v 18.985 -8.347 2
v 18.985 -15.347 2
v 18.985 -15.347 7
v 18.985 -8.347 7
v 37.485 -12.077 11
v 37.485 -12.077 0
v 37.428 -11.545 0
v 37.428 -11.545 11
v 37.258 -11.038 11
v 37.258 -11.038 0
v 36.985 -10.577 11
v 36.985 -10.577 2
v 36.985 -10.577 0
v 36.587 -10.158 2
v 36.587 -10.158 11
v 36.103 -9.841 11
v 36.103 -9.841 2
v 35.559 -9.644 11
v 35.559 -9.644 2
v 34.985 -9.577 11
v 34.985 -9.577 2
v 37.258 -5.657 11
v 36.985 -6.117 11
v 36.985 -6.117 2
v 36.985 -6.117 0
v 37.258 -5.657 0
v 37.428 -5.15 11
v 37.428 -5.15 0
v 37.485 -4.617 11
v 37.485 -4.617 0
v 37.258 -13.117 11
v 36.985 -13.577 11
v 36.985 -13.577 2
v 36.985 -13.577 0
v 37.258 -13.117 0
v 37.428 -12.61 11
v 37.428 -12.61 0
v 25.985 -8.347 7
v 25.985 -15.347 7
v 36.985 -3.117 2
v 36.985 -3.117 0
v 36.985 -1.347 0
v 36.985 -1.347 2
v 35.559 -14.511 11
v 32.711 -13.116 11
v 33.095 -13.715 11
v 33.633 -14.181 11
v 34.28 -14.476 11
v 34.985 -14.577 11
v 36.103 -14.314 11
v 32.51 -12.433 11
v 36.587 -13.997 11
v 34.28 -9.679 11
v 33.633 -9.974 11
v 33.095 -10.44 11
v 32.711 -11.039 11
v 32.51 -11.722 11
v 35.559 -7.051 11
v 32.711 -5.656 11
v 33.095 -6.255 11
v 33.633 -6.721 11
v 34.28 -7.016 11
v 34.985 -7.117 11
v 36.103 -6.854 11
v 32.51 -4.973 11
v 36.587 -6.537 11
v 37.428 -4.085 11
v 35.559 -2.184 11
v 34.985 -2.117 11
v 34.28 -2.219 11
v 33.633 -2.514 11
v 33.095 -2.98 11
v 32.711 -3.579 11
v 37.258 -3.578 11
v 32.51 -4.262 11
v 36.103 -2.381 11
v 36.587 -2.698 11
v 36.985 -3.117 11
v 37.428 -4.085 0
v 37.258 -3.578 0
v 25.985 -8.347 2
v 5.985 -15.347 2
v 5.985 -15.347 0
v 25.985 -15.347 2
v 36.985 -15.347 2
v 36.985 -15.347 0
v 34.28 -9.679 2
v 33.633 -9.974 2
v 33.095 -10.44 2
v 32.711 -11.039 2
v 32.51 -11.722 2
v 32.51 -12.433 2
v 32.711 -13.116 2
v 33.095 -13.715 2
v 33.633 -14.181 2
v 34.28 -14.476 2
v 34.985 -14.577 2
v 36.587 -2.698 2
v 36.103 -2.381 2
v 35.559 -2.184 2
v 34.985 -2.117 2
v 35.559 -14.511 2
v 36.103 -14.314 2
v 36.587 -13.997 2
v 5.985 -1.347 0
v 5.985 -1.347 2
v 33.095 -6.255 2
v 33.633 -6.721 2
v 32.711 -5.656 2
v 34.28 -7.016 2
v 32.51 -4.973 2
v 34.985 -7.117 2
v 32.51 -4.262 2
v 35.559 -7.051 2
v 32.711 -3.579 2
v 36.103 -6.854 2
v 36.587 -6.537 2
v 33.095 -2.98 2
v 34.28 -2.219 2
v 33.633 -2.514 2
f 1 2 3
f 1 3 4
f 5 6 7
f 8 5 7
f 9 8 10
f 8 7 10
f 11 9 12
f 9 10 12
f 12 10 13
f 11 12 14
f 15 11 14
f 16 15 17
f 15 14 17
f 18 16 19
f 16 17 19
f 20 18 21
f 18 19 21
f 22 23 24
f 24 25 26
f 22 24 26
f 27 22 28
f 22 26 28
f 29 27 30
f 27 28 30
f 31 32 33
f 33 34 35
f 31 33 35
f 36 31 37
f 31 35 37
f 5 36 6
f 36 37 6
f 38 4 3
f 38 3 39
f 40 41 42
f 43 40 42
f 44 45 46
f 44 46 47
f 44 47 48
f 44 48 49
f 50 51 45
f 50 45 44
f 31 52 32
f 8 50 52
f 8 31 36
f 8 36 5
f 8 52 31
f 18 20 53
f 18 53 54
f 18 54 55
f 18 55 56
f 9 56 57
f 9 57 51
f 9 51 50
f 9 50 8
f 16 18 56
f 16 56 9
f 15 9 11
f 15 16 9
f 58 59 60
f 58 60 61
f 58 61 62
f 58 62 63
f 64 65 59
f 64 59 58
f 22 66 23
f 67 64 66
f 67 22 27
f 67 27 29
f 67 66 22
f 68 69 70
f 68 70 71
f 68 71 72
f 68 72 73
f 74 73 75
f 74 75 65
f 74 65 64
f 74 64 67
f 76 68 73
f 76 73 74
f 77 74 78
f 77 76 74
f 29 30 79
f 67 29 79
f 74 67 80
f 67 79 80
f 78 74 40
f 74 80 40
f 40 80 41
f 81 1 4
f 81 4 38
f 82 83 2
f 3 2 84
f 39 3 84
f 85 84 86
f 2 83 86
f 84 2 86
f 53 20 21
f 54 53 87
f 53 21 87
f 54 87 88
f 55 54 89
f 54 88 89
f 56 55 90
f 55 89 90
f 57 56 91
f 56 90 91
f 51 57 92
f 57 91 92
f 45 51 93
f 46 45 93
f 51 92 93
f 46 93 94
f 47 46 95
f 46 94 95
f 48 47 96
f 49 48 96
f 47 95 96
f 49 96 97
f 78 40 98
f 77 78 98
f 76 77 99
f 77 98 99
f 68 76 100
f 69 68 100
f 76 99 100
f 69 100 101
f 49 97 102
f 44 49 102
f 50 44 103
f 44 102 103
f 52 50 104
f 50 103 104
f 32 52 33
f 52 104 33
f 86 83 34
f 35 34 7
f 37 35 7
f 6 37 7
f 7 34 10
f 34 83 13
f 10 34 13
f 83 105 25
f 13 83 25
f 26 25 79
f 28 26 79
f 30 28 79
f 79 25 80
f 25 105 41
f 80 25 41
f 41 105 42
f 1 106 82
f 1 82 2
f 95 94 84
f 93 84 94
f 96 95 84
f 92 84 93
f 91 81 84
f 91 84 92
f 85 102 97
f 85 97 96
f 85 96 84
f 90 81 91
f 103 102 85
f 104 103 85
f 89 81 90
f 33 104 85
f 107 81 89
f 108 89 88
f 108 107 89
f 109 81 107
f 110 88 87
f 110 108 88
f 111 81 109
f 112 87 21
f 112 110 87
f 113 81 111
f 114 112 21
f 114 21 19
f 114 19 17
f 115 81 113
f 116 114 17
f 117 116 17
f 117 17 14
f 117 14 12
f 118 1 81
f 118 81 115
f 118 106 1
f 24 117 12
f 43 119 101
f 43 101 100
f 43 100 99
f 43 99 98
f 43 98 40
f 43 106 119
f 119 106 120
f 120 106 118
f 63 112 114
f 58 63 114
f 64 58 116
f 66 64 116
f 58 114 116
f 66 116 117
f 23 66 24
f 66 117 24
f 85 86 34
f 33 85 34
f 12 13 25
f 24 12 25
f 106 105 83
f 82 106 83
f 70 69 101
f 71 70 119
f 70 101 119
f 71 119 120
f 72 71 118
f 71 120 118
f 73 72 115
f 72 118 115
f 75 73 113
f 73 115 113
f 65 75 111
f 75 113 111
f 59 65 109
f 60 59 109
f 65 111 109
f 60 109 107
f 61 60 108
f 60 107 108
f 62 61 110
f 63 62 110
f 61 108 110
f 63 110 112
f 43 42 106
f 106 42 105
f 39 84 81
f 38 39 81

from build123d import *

# Parameters (mm, degrees)
F0_W     = 7
F0_H     = 7
F1_DEPTH = 7
F2_DEPTH = 11
F3_DEPTH = 2


with BuildPart() as f1:
    # F0 (on Top) → F1 (new body)
    with BuildSketch(Plane.XY):
        with Locations((22.4848273695, -11.8474444523)):
            Rectangle(F0_W, F0_H)
    extrude(amount=F1_DEPTH)



with BuildPart() as f2:
    # F0 (on Top) → F2 (new body)
    with BuildSketch(Plane.XY):
        with BuildLine():
            Line((34.9848273695, -3.1174444523), (34.9848273695, -2.1174444523))
            ThreePointArc((34.9848273695, -2.1174444523), (32.4848273695, -4.6174444523), (34.9848273695, -7.1174444523))
            Line((34.9848273695, -7.1174444523), (34.9848273695, -6.1174444523))
            ThreePointArc((34.9848273695, -6.1174444523), (33.4848273695, -4.6174444523), (34.9848273695, -3.1174444523))
        make_face()
        with BuildLine():
            Line((34.9848273695, -3.3474444523), (34.9848273695, -3.1174444523))
            ThreePointArc((34.9848273695, -3.1174444523), (33.4848273695, -4.6174444523), (34.9848273695, -6.1174444523))
            Line((34.9848273695, -6.1174444523), (34.9848273695, -5.8874444523))
            Line((34.9848273695, -5.8874444523), (34.9848273695, -3.3474444523))
        make_face()
        with BuildLine():
            ThreePointArc((36.4848273695, -4.6174444523), (36.0454875412, -3.5567842806), (34.9848273695, -3.1174444523))
            Line((34.9848273695, -3.1174444523), (34.9848273695, -3.3474444523))
            Line((34.9848273695, -3.3474444523), (34.9848273695, -5.8874444523))
            Line((34.9848273695, -5.8874444523), (34.9848273695, -6.1174444523))
            ThreePointArc((34.9848273695, -6.1174444523), (36.0454875412, -5.6781046241), (36.4848273695, -4.6174444523))
        make_face()
        with BuildLine():
            ThreePointArc((36.9848273695, -3.1174444523), (36.1028613582, -2.3813764748), (34.9848273695, -2.1174444523))
            Line((34.9848273695, -2.1174444523), (34.9848273695, -3.1174444523))
            ThreePointArc((34.9848273695, -3.1174444523), (36.0454875412, -3.5567842806), (36.4848273695, -4.6174444523))
            ThreePointArc((36.4848273695, -4.6174444523), (36.0454875412, -5.6781046241), (34.9848273695, -6.1174444523))
            Line((34.9848273695, -6.1174444523), (34.9848273695, -7.1174444523))
            ThreePointArc((34.9848273695, -7.1174444523), (36.1028613582, -6.8535124298), (36.9848273695, -6.1174444523))
            Line((36.9848273695, -6.1174444523), (36.9848273695, -3.1174444523))
        make_face()
        with BuildLine():
            ThreePointArc((37.4848273695, -4.6174444523), (37.3565356146, -3.8268750373), (36.9848273695, -3.1174444523))
            Line((36.9848273695, -3.1174444523), (36.9848273695, -6.1174444523))
            ThreePointArc((36.9848273695, -6.1174444523), (37.3565356146, -5.4080138674), (37.4848273695, -4.6174444523))
        make_face()
    extrude(amount=F2_DEPTH)


with BuildPart() as f2b:
    # F0 (on Top) → F2, piece 2 (new body)
    with BuildSketch(Plane.XY):
        with BuildLine():
            ThreePointArc((36.4848273695, -12.0774444523), (36.0454875412, -11.0167842806), (34.9848273695, -10.5774444523))
            Line((34.9848273695, -10.5774444523), (34.9848273695, -10.8074444523))
            Line((34.9848273695, -10.8074444523), (34.9848273695, -13.3474444523))
            Line((34.9848273695, -13.3474444523), (34.9848273695, -13.5774444523))
            ThreePointArc((34.9848273695, -13.5774444523), (36.0454875412, -13.1381046241), (36.4848273695, -12.0774444523))
        make_face()
        with BuildLine():
            ThreePointArc((37.4848273695, -12.0774444523), (37.3565356146, -11.2868750373), (36.9848273695, -10.5774444523))
            Line((36.9848273695, -10.5774444523), (36.9848273695, -13.5774444523))
            ThreePointArc((36.9848273695, -13.5774444523), (37.3565356146, -12.8680138674), (37.4848273695, -12.0774444523))
        make_face()
        with BuildLine():
            ThreePointArc((36.9848273695, -10.5774444523), (36.1028613582, -9.8413764748), (34.9848273695, -9.5774444523))
            Line((34.9848273695, -9.5774444523), (34.9848273695, -10.5774444523))
            ThreePointArc((34.9848273695, -10.5774444523), (36.0454875412, -11.0167842806), (36.4848273695, -12.0774444523))
            ThreePointArc((36.4848273695, -12.0774444523), (36.0454875412, -13.1381046241), (34.9848273695, -13.5774444523))
            Line((34.9848273695, -13.5774444523), (34.9848273695, -14.5774444523))
            ThreePointArc((34.9848273695, -14.5774444523), (36.1028613582, -14.3135124298), (36.9848273695, -13.5774444523))
            Line((36.9848273695, -13.5774444523), (36.9848273695, -10.5774444523))
        make_face()
        with BuildLine():
            Line((34.9848273695, -10.8074444523), (34.9848273695, -10.5774444523))
            ThreePointArc((34.9848273695, -10.5774444523), (33.4848273695, -12.0774444523), (34.9848273695, -13.5774444523))
            Line((34.9848273695, -13.5774444523), (34.9848273695, -13.3474444523))
            Line((34.9848273695, -13.3474444523), (34.9848273695, -10.8074444523))
        make_face()
        with BuildLine():
            Line((34.9848273695, -10.5774444523), (34.9848273695, -9.5774444523))
            ThreePointArc((34.9848273695, -9.5774444523), (32.4848273695, -12.0774444523), (34.9848273695, -14.5774444523))
            Line((34.9848273695, -14.5774444523), (34.9848273695, -13.5774444523))
            ThreePointArc((34.9848273695, -13.5774444523), (33.4848273695, -12.0774444523), (34.9848273695, -10.5774444523))
        make_face()
    extrude(amount=F2_DEPTH)


with BuildPart() as f1_1:
    add(f1.part)

    add(f2.part)  # F3 merges F2

    add(f2b.part)  # F3 merges F2b
    # F0 (on Top) → F3 (join)
    with BuildSketch(Plane.XY):
        with BuildLine():
            Line((34.9848273695, -1.3474444523), (5.9848273695, -1.3474444523))
            Line((5.9848273695, -1.3474444523), (5.9848273695, -15.3474444523))
            Line((5.9848273695, -15.3474444523), (18.9848273695, -15.3474444523))
            Line((18.9848273695, -15.3474444523), (18.9848273695, -8.3474444523))
            Line((18.9848273695, -8.3474444523), (25.9848273695, -8.3474444523))
            Line((25.9848273695, -8.3474444523), (25.9848273695, -15.3474444523))
            Line((25.9848273695, -15.3474444523), (34.9848273695, -15.3474444523))
            Line((34.9848273695, -15.3474444523), (34.9848273695, -14.5774444523))
            ThreePointArc((34.9848273695, -14.5774444523), (32.4848273695, -12.0774444523), (34.9848273695, -9.5774444523))
            Line((34.9848273695, -9.5774444523), (34.9848273695, -7.1174444523))
            ThreePointArc((34.9848273695, -7.1174444523), (32.4848273695, -4.6174444523), (34.9848273695, -2.1174444523))
            Line((34.9848273695, -2.1174444523), (34.9848273695, -1.3474444523))
        make_face()
        with BuildLine():
            Line((34.9848273695, -14.5774444523), (34.9848273695, -15.3474444523))
            Line((34.9848273695, -15.3474444523), (36.9848273695, -15.3474444523))
            Line((36.9848273695, -15.3474444523), (36.9848273695, -13.5774444523))
            ThreePointArc((36.9848273695, -13.5774444523), (36.1028613582, -14.3135124298), (34.9848273695, -14.5774444523))
        make_face()
        with BuildLine():
            ThreePointArc((36.9848273695, -6.1174444523), (36.1028613582, -6.8535124298), (34.9848273695, -7.1174444523))
            Line((34.9848273695, -7.1174444523), (34.9848273695, -9.5774444523))
            ThreePointArc((34.9848273695, -9.5774444523), (36.1028613582, -9.8413764748), (36.9848273695, -10.5774444523))
            Line((36.9848273695, -10.5774444523), (36.9848273695, -6.1174444523))
        make_face()
        with BuildLine():
            Line((36.9848273695, -1.3474444523), (34.9848273695, -1.3474444523))
            Line((34.9848273695, -1.3474444523), (34.9848273695, -2.1174444523))
            ThreePointArc((34.9848273695, -2.1174444523), (36.1028613582, -2.3813764748), (36.9848273695, -3.1174444523))
            Line((36.9848273695, -3.1174444523), (36.9848273695, -1.3474444523))
        make_face()
    extrude(amount=F3_DEPTH)


solid = f1_1.part
